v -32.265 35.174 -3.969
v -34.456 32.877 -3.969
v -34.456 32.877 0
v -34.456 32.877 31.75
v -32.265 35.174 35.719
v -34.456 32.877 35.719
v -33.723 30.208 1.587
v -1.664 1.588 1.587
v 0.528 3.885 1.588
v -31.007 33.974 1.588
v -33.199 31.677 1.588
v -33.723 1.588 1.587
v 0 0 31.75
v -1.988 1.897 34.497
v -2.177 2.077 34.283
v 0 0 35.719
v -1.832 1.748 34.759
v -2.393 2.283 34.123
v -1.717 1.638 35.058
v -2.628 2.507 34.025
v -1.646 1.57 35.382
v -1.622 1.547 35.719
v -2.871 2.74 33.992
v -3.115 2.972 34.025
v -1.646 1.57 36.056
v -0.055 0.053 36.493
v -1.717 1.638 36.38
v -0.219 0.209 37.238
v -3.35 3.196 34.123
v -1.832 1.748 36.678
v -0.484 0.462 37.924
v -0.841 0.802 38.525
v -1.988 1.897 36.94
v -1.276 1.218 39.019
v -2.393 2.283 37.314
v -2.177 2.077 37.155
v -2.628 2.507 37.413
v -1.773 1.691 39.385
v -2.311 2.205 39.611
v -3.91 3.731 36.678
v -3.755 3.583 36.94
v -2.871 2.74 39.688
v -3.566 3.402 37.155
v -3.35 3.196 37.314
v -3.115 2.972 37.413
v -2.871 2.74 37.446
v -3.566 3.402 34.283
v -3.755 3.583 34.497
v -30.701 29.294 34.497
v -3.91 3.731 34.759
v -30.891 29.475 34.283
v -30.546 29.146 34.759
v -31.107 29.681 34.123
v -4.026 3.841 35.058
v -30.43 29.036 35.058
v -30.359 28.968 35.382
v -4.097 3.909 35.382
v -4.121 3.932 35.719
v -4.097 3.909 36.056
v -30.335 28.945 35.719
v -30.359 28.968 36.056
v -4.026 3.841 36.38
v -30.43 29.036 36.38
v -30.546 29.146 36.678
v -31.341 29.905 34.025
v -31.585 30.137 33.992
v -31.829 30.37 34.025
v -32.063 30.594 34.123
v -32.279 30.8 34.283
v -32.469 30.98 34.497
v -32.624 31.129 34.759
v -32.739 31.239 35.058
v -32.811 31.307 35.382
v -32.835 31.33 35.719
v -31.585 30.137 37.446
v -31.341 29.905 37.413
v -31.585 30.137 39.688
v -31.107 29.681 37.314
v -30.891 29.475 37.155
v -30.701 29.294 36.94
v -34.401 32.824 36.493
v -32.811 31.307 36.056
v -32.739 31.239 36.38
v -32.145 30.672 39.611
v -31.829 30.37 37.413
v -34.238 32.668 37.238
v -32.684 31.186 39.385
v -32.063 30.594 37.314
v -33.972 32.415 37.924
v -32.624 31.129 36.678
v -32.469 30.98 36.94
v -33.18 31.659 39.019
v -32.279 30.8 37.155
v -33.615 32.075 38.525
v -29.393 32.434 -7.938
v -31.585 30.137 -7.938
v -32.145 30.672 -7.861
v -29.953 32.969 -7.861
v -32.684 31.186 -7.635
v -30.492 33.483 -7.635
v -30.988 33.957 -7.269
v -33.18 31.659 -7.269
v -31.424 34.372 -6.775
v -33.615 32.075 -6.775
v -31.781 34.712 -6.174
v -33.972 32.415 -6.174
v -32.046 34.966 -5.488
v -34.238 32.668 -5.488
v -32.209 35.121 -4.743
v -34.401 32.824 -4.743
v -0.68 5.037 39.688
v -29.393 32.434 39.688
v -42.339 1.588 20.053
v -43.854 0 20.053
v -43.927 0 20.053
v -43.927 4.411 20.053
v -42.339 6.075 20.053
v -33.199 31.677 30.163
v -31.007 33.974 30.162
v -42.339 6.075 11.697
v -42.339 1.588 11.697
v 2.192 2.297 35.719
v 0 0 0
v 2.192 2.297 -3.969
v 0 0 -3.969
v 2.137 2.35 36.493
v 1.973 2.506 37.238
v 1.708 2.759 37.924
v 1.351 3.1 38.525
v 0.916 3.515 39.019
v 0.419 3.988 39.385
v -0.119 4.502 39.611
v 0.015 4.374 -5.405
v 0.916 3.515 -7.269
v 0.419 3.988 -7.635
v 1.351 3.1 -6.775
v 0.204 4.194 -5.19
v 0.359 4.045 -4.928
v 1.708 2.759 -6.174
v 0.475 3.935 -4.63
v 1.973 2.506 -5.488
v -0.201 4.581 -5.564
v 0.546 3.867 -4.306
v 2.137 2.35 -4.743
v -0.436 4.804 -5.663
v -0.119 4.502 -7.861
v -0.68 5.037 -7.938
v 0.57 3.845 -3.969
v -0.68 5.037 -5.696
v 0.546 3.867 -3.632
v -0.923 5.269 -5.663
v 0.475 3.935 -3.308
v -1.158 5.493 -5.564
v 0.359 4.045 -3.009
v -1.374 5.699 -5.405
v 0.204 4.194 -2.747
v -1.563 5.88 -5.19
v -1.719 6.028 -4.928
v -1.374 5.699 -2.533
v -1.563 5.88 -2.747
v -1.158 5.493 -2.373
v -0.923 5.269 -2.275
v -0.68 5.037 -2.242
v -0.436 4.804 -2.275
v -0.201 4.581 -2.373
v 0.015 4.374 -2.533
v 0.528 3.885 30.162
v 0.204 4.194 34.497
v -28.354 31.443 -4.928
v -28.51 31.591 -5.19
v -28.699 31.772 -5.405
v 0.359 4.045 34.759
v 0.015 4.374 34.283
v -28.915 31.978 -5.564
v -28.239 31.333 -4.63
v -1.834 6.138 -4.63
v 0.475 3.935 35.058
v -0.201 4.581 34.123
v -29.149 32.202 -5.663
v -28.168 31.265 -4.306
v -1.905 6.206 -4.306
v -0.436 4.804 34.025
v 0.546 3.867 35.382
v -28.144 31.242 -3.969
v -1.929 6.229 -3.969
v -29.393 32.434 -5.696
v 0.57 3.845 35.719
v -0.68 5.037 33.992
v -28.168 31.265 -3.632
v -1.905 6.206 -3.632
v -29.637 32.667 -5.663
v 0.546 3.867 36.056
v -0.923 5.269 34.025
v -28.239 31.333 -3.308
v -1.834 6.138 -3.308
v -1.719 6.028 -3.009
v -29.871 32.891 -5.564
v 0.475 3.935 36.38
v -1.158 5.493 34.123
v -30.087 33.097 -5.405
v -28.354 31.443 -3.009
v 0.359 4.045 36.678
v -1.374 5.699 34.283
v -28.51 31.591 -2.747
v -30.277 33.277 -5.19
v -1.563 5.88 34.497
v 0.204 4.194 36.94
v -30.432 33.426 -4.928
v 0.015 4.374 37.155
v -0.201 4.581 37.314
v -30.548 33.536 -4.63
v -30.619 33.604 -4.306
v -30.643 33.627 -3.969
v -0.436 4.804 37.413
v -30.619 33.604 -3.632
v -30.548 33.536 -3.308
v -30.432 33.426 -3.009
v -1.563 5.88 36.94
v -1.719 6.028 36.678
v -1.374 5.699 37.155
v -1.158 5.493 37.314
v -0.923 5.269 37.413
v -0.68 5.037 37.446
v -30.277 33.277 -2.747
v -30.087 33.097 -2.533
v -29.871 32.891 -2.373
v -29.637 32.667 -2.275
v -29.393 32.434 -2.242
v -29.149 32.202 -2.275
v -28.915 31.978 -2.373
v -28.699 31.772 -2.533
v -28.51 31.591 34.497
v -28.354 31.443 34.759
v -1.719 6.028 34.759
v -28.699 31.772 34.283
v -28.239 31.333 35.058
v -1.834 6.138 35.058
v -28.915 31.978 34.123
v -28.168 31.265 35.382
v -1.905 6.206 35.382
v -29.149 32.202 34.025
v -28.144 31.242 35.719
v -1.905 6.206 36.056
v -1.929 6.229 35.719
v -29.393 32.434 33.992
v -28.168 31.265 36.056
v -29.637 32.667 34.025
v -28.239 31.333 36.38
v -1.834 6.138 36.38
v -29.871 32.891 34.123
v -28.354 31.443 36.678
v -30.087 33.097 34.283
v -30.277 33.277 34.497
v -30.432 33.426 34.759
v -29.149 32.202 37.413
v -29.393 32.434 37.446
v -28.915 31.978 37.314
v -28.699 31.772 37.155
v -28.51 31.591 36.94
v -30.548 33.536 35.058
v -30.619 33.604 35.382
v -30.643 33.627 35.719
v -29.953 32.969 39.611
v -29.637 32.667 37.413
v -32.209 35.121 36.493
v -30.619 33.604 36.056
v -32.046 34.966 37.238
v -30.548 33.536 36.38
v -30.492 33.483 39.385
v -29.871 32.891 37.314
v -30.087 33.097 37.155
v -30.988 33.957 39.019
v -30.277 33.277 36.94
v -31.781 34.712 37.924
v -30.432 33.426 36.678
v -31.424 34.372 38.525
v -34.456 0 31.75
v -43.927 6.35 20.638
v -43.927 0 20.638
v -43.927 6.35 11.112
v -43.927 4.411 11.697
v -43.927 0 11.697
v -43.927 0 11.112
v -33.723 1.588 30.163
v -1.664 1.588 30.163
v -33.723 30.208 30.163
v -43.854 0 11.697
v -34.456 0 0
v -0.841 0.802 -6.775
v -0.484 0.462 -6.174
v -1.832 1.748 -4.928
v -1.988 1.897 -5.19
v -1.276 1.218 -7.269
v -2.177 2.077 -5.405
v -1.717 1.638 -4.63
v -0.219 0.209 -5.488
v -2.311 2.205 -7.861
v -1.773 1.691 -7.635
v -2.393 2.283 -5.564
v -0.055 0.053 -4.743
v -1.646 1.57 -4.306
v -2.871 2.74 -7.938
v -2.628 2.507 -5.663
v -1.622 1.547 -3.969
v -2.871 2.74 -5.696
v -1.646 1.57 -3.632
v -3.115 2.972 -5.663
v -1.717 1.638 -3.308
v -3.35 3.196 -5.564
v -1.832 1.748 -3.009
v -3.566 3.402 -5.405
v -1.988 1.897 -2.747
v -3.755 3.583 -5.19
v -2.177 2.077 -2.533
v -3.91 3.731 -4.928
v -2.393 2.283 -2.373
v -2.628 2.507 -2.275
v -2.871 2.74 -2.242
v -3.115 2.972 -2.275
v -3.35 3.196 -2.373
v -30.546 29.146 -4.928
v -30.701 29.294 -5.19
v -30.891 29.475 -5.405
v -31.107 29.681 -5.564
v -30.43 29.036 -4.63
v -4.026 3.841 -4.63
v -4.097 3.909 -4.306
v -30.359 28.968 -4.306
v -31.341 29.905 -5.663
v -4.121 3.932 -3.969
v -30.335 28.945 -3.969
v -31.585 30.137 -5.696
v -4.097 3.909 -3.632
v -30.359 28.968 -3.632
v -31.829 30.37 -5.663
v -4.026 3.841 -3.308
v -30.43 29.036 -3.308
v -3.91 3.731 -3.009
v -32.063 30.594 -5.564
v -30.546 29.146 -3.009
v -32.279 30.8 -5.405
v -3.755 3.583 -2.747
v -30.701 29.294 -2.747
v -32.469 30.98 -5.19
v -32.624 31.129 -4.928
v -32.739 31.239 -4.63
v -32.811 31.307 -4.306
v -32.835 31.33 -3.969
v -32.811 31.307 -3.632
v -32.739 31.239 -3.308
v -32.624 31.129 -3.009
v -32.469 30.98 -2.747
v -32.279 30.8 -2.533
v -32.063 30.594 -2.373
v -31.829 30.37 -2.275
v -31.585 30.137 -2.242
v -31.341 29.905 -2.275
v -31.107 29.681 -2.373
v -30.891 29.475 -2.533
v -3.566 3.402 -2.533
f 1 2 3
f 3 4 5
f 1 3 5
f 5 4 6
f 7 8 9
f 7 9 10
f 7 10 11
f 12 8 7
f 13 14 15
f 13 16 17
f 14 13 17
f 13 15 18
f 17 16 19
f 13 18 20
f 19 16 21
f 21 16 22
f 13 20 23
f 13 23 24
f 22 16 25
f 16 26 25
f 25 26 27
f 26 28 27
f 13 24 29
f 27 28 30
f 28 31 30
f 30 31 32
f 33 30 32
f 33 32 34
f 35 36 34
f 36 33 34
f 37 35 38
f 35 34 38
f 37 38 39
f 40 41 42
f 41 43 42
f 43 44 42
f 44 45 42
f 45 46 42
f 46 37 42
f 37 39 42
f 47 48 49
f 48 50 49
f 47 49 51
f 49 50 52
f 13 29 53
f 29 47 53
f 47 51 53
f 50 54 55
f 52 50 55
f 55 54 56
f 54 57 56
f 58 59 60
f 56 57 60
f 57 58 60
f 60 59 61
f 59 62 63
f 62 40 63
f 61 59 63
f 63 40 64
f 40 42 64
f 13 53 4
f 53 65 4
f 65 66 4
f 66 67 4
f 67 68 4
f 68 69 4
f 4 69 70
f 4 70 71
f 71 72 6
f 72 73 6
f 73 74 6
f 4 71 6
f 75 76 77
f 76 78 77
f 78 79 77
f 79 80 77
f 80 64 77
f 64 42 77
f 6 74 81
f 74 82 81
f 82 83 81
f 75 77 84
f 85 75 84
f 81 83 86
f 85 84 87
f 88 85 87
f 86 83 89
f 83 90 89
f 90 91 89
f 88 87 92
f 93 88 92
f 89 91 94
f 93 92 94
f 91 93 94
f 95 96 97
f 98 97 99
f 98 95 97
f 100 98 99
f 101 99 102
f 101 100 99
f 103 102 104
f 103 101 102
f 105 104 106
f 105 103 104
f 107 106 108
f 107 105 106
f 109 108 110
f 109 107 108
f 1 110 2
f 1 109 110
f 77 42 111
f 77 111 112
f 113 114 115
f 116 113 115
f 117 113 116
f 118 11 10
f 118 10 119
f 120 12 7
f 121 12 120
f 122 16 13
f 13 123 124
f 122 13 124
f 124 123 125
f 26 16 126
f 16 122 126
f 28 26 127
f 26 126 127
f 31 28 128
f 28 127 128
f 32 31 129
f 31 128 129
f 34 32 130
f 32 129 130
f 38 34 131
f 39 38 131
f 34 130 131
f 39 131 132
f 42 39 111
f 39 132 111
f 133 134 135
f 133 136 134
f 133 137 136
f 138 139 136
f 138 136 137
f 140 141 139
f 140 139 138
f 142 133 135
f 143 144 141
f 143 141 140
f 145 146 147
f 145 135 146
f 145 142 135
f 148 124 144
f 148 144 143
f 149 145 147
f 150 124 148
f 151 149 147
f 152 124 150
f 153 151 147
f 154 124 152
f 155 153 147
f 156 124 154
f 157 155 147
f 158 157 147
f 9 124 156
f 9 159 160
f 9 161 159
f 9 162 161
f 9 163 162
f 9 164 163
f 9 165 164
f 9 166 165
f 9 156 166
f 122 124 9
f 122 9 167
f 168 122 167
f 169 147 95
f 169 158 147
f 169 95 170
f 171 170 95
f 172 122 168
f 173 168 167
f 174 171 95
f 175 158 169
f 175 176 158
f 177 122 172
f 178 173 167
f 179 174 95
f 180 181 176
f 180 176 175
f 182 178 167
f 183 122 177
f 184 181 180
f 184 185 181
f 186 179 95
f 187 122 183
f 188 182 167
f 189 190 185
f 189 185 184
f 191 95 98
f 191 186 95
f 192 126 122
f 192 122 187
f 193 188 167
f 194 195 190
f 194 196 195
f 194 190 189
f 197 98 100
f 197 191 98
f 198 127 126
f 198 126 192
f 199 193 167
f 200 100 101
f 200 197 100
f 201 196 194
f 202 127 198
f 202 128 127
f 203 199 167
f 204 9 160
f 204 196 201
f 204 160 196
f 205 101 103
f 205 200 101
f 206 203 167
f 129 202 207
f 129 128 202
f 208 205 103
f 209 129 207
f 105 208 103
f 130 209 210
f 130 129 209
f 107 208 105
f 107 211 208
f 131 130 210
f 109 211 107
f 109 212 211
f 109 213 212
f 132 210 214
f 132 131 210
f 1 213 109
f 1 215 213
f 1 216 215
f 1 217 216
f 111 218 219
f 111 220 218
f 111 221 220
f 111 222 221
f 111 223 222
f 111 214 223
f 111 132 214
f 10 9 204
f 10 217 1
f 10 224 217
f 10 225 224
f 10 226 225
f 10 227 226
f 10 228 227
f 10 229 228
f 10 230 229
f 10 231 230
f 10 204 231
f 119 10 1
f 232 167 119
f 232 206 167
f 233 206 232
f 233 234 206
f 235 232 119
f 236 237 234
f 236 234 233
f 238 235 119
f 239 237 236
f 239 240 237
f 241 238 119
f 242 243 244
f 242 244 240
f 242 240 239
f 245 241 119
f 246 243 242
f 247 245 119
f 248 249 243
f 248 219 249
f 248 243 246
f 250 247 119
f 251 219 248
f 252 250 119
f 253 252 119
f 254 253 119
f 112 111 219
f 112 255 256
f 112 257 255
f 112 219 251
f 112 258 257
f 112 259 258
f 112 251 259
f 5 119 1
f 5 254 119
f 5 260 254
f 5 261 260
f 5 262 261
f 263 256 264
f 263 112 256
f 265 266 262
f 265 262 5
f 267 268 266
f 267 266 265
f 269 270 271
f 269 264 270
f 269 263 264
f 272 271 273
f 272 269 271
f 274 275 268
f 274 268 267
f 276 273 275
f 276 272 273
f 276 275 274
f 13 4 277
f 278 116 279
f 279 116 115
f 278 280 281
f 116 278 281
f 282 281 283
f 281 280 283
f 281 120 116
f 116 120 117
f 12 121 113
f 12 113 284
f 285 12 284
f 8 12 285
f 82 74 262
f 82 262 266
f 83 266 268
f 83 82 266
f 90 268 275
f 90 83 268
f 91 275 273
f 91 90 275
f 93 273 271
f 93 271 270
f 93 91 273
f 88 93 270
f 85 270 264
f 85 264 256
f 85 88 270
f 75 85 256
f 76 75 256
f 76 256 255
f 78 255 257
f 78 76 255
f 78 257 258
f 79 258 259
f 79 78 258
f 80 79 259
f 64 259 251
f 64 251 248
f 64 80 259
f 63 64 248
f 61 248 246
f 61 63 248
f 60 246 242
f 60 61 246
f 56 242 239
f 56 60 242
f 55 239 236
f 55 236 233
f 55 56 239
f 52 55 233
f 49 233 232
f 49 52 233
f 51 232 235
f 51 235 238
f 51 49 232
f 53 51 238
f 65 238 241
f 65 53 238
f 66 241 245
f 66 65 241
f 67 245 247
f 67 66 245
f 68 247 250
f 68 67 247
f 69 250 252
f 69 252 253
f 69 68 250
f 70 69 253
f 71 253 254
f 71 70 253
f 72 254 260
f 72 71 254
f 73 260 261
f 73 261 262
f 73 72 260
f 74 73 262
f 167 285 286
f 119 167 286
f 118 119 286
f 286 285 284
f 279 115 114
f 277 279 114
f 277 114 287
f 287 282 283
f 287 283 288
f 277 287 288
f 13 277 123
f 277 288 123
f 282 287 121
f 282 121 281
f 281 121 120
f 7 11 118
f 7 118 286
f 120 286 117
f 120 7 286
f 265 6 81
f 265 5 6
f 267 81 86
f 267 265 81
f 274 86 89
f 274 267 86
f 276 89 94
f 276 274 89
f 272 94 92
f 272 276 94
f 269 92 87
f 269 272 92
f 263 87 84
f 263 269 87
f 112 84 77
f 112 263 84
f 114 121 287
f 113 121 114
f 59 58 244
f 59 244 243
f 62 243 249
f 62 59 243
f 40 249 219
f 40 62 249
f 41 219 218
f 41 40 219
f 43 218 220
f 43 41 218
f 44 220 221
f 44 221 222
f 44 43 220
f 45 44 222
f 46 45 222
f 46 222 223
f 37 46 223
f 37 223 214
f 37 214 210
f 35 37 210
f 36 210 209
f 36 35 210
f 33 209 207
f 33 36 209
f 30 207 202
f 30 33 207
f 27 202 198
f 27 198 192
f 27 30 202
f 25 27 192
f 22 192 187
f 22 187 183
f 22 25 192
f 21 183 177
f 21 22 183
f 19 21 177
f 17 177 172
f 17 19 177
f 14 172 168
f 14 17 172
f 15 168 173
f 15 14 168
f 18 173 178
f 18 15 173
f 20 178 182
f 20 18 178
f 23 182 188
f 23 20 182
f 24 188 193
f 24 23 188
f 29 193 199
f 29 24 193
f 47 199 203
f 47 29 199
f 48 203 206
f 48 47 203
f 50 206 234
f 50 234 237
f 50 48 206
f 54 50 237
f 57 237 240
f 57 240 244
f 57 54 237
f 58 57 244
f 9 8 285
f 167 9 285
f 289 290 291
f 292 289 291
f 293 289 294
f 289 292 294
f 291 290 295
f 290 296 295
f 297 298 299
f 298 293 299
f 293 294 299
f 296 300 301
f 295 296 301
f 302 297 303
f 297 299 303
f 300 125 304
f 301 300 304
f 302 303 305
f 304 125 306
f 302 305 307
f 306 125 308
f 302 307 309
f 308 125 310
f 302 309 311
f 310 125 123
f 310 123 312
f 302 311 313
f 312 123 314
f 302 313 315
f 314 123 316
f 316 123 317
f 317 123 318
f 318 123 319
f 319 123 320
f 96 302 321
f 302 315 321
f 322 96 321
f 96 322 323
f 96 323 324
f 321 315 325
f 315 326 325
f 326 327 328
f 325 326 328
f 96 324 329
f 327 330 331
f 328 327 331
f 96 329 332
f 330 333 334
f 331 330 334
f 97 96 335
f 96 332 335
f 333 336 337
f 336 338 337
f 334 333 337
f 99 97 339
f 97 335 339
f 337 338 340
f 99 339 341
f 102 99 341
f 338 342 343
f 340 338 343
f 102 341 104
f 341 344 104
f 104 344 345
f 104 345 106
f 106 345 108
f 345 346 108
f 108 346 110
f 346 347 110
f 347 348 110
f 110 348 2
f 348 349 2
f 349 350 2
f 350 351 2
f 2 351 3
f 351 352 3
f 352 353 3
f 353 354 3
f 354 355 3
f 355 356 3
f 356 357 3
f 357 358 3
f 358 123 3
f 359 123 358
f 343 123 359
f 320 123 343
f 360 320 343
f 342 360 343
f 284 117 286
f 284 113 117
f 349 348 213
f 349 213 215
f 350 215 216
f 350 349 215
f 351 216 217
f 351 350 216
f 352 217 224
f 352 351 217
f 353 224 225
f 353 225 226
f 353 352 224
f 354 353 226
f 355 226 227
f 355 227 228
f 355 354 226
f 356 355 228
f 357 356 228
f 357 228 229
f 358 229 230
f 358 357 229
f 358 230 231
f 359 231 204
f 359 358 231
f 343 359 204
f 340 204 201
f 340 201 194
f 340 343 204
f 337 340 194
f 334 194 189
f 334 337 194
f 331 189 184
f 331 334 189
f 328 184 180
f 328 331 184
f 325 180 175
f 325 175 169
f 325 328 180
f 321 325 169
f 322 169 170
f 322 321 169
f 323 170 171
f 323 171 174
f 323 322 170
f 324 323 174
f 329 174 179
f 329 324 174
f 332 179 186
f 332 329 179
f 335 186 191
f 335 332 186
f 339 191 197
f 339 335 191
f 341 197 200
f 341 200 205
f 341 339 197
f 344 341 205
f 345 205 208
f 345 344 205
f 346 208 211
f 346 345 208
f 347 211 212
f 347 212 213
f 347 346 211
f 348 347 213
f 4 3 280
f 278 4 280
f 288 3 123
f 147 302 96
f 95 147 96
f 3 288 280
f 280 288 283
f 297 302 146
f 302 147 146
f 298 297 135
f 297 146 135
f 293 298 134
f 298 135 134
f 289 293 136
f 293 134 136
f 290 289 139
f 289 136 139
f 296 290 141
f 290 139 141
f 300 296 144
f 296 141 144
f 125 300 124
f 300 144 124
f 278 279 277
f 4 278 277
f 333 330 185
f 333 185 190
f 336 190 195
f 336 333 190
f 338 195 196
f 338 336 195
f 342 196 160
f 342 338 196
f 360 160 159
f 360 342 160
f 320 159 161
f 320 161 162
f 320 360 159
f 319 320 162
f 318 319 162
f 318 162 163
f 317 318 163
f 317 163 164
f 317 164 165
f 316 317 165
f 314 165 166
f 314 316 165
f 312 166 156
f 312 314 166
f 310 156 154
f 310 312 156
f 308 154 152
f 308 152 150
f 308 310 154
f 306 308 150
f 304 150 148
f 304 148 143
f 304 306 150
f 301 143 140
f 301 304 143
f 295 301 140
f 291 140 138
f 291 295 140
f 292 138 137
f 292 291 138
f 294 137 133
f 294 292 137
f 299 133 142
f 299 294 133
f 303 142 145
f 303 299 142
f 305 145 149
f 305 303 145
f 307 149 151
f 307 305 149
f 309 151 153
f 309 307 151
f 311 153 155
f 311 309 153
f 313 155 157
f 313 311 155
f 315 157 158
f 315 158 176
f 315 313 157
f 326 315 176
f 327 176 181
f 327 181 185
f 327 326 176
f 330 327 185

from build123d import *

# Parameters (mm, degrees)
F1_DEPTH = 31.75
F3_DEPTH = 33.8770445158
F4_T     = -1.5875
F5_W     = 3.0979418965
F5_H     = 8.3555914986
F6_DEPTH = 31.3793581519
F7_W     = 47.625
F7_H     = 7.9375
F7_R     = 1.7272
F7_H_2   = 31.75
F7_W_2   = 43.5875253129
F7_H_3   = 28.575
F8_DEPTH = 3.175
F9_R     = 3.96875


with BuildPart() as f1:
    # F0 (on Top) → F1 (new body)
    with BuildSketch(Plane.XY):
        Polygon((-43.9269818101, 0), (0, 0), (-34.4563574527, 32.8770445158), (-43.9269818101, 6.35), align=None)
    extrude(amount=F1_DEPTH)

    # F2 (on face) → F3 (cut, up to face)
    with BuildSketch(Plane.XZ):
        Polygon((-43.9269818101, 11.1125), (-43.9269818101, 0), (-34.4563574527, 0), align=None)
        Polygon((-34.4563574527, 31.75), (-43.9269818101, 31.75), (-43.9269818101, 20.6375), align=None)
    extrude(amount=-F3_DEPTH, mode=Mode.SUBTRACT)

    # F4
    f4_openings = [f1.faces().sort_by_distance(p)[0] for p in [
        (-17.228179, 16.438522, 15.875),
    ]]
    offset(amount=F4_T, openings=f4_openings)

    # F5 (on face) → F6 (cut, up to face)
    with BuildSketch(Plane(origin=(0, 0, 0), x_dir=(-0.7234930699, 0.6903316434, 0), z_dir=(0.6903316434, 0.7234930699, 0))):
        with Locations((33.2771941037, 15.875)):
            Rectangle(F5_W, F5_H)
    extrude(amount=-F6_DEPTH, mode=Mode.SUBTRACT)

    # F7 (on face) → F8 (join)
    with BuildSketch(Plane(origin=(0, 0, 0), x_dir=(-0.7234930699, 0.6903316434, 0), z_dir=(0.6903316434, 0.7234930699, 0))):
        with Locations((23.8125, -3.96875)):
            Rectangle(F7_W, F7_H)
        with Locations((3.96875, -3.96875)):
            Circle(F7_R, mode=Mode.SUBTRACT)
        with Locations((43.65625, -3.96875)):
            Circle(F7_R, mode=Mode.SUBTRACT)
        with Locations((23.8125, 35.71875)):
            Rectangle(F7_W, F7_H)
        with Locations((3.96875, 35.71875)):
            Circle(F7_R, mode=Mode.SUBTRACT)
        with Locations((43.65625, 35.71875)):
            Circle(F7_R, mode=Mode.SUBTRACT)
        with Locations((23.8125, 15.875)):
            Rectangle(F7_W, F7_H_2)
        with Locations((24.0933819992, 15.875)):
            Rectangle(F7_W_2, F7_H_3, mode=Mode.SUBTRACT)
    extrude(amount=F8_DEPTH)

    # F9
    f9_edges = [f1.edges().sort_by_distance(p)[0] for p in [
        (-33.360456, 34.02559, -7.9375),
        (1.095901, 1.148545, -7.9375),
        (-33.360456, 34.02559, 39.6875),
        (1.095901, 1.148545, 39.6875),
    ]]
    fillet(f9_edges, radius=F9_R)


solid = f1.part
